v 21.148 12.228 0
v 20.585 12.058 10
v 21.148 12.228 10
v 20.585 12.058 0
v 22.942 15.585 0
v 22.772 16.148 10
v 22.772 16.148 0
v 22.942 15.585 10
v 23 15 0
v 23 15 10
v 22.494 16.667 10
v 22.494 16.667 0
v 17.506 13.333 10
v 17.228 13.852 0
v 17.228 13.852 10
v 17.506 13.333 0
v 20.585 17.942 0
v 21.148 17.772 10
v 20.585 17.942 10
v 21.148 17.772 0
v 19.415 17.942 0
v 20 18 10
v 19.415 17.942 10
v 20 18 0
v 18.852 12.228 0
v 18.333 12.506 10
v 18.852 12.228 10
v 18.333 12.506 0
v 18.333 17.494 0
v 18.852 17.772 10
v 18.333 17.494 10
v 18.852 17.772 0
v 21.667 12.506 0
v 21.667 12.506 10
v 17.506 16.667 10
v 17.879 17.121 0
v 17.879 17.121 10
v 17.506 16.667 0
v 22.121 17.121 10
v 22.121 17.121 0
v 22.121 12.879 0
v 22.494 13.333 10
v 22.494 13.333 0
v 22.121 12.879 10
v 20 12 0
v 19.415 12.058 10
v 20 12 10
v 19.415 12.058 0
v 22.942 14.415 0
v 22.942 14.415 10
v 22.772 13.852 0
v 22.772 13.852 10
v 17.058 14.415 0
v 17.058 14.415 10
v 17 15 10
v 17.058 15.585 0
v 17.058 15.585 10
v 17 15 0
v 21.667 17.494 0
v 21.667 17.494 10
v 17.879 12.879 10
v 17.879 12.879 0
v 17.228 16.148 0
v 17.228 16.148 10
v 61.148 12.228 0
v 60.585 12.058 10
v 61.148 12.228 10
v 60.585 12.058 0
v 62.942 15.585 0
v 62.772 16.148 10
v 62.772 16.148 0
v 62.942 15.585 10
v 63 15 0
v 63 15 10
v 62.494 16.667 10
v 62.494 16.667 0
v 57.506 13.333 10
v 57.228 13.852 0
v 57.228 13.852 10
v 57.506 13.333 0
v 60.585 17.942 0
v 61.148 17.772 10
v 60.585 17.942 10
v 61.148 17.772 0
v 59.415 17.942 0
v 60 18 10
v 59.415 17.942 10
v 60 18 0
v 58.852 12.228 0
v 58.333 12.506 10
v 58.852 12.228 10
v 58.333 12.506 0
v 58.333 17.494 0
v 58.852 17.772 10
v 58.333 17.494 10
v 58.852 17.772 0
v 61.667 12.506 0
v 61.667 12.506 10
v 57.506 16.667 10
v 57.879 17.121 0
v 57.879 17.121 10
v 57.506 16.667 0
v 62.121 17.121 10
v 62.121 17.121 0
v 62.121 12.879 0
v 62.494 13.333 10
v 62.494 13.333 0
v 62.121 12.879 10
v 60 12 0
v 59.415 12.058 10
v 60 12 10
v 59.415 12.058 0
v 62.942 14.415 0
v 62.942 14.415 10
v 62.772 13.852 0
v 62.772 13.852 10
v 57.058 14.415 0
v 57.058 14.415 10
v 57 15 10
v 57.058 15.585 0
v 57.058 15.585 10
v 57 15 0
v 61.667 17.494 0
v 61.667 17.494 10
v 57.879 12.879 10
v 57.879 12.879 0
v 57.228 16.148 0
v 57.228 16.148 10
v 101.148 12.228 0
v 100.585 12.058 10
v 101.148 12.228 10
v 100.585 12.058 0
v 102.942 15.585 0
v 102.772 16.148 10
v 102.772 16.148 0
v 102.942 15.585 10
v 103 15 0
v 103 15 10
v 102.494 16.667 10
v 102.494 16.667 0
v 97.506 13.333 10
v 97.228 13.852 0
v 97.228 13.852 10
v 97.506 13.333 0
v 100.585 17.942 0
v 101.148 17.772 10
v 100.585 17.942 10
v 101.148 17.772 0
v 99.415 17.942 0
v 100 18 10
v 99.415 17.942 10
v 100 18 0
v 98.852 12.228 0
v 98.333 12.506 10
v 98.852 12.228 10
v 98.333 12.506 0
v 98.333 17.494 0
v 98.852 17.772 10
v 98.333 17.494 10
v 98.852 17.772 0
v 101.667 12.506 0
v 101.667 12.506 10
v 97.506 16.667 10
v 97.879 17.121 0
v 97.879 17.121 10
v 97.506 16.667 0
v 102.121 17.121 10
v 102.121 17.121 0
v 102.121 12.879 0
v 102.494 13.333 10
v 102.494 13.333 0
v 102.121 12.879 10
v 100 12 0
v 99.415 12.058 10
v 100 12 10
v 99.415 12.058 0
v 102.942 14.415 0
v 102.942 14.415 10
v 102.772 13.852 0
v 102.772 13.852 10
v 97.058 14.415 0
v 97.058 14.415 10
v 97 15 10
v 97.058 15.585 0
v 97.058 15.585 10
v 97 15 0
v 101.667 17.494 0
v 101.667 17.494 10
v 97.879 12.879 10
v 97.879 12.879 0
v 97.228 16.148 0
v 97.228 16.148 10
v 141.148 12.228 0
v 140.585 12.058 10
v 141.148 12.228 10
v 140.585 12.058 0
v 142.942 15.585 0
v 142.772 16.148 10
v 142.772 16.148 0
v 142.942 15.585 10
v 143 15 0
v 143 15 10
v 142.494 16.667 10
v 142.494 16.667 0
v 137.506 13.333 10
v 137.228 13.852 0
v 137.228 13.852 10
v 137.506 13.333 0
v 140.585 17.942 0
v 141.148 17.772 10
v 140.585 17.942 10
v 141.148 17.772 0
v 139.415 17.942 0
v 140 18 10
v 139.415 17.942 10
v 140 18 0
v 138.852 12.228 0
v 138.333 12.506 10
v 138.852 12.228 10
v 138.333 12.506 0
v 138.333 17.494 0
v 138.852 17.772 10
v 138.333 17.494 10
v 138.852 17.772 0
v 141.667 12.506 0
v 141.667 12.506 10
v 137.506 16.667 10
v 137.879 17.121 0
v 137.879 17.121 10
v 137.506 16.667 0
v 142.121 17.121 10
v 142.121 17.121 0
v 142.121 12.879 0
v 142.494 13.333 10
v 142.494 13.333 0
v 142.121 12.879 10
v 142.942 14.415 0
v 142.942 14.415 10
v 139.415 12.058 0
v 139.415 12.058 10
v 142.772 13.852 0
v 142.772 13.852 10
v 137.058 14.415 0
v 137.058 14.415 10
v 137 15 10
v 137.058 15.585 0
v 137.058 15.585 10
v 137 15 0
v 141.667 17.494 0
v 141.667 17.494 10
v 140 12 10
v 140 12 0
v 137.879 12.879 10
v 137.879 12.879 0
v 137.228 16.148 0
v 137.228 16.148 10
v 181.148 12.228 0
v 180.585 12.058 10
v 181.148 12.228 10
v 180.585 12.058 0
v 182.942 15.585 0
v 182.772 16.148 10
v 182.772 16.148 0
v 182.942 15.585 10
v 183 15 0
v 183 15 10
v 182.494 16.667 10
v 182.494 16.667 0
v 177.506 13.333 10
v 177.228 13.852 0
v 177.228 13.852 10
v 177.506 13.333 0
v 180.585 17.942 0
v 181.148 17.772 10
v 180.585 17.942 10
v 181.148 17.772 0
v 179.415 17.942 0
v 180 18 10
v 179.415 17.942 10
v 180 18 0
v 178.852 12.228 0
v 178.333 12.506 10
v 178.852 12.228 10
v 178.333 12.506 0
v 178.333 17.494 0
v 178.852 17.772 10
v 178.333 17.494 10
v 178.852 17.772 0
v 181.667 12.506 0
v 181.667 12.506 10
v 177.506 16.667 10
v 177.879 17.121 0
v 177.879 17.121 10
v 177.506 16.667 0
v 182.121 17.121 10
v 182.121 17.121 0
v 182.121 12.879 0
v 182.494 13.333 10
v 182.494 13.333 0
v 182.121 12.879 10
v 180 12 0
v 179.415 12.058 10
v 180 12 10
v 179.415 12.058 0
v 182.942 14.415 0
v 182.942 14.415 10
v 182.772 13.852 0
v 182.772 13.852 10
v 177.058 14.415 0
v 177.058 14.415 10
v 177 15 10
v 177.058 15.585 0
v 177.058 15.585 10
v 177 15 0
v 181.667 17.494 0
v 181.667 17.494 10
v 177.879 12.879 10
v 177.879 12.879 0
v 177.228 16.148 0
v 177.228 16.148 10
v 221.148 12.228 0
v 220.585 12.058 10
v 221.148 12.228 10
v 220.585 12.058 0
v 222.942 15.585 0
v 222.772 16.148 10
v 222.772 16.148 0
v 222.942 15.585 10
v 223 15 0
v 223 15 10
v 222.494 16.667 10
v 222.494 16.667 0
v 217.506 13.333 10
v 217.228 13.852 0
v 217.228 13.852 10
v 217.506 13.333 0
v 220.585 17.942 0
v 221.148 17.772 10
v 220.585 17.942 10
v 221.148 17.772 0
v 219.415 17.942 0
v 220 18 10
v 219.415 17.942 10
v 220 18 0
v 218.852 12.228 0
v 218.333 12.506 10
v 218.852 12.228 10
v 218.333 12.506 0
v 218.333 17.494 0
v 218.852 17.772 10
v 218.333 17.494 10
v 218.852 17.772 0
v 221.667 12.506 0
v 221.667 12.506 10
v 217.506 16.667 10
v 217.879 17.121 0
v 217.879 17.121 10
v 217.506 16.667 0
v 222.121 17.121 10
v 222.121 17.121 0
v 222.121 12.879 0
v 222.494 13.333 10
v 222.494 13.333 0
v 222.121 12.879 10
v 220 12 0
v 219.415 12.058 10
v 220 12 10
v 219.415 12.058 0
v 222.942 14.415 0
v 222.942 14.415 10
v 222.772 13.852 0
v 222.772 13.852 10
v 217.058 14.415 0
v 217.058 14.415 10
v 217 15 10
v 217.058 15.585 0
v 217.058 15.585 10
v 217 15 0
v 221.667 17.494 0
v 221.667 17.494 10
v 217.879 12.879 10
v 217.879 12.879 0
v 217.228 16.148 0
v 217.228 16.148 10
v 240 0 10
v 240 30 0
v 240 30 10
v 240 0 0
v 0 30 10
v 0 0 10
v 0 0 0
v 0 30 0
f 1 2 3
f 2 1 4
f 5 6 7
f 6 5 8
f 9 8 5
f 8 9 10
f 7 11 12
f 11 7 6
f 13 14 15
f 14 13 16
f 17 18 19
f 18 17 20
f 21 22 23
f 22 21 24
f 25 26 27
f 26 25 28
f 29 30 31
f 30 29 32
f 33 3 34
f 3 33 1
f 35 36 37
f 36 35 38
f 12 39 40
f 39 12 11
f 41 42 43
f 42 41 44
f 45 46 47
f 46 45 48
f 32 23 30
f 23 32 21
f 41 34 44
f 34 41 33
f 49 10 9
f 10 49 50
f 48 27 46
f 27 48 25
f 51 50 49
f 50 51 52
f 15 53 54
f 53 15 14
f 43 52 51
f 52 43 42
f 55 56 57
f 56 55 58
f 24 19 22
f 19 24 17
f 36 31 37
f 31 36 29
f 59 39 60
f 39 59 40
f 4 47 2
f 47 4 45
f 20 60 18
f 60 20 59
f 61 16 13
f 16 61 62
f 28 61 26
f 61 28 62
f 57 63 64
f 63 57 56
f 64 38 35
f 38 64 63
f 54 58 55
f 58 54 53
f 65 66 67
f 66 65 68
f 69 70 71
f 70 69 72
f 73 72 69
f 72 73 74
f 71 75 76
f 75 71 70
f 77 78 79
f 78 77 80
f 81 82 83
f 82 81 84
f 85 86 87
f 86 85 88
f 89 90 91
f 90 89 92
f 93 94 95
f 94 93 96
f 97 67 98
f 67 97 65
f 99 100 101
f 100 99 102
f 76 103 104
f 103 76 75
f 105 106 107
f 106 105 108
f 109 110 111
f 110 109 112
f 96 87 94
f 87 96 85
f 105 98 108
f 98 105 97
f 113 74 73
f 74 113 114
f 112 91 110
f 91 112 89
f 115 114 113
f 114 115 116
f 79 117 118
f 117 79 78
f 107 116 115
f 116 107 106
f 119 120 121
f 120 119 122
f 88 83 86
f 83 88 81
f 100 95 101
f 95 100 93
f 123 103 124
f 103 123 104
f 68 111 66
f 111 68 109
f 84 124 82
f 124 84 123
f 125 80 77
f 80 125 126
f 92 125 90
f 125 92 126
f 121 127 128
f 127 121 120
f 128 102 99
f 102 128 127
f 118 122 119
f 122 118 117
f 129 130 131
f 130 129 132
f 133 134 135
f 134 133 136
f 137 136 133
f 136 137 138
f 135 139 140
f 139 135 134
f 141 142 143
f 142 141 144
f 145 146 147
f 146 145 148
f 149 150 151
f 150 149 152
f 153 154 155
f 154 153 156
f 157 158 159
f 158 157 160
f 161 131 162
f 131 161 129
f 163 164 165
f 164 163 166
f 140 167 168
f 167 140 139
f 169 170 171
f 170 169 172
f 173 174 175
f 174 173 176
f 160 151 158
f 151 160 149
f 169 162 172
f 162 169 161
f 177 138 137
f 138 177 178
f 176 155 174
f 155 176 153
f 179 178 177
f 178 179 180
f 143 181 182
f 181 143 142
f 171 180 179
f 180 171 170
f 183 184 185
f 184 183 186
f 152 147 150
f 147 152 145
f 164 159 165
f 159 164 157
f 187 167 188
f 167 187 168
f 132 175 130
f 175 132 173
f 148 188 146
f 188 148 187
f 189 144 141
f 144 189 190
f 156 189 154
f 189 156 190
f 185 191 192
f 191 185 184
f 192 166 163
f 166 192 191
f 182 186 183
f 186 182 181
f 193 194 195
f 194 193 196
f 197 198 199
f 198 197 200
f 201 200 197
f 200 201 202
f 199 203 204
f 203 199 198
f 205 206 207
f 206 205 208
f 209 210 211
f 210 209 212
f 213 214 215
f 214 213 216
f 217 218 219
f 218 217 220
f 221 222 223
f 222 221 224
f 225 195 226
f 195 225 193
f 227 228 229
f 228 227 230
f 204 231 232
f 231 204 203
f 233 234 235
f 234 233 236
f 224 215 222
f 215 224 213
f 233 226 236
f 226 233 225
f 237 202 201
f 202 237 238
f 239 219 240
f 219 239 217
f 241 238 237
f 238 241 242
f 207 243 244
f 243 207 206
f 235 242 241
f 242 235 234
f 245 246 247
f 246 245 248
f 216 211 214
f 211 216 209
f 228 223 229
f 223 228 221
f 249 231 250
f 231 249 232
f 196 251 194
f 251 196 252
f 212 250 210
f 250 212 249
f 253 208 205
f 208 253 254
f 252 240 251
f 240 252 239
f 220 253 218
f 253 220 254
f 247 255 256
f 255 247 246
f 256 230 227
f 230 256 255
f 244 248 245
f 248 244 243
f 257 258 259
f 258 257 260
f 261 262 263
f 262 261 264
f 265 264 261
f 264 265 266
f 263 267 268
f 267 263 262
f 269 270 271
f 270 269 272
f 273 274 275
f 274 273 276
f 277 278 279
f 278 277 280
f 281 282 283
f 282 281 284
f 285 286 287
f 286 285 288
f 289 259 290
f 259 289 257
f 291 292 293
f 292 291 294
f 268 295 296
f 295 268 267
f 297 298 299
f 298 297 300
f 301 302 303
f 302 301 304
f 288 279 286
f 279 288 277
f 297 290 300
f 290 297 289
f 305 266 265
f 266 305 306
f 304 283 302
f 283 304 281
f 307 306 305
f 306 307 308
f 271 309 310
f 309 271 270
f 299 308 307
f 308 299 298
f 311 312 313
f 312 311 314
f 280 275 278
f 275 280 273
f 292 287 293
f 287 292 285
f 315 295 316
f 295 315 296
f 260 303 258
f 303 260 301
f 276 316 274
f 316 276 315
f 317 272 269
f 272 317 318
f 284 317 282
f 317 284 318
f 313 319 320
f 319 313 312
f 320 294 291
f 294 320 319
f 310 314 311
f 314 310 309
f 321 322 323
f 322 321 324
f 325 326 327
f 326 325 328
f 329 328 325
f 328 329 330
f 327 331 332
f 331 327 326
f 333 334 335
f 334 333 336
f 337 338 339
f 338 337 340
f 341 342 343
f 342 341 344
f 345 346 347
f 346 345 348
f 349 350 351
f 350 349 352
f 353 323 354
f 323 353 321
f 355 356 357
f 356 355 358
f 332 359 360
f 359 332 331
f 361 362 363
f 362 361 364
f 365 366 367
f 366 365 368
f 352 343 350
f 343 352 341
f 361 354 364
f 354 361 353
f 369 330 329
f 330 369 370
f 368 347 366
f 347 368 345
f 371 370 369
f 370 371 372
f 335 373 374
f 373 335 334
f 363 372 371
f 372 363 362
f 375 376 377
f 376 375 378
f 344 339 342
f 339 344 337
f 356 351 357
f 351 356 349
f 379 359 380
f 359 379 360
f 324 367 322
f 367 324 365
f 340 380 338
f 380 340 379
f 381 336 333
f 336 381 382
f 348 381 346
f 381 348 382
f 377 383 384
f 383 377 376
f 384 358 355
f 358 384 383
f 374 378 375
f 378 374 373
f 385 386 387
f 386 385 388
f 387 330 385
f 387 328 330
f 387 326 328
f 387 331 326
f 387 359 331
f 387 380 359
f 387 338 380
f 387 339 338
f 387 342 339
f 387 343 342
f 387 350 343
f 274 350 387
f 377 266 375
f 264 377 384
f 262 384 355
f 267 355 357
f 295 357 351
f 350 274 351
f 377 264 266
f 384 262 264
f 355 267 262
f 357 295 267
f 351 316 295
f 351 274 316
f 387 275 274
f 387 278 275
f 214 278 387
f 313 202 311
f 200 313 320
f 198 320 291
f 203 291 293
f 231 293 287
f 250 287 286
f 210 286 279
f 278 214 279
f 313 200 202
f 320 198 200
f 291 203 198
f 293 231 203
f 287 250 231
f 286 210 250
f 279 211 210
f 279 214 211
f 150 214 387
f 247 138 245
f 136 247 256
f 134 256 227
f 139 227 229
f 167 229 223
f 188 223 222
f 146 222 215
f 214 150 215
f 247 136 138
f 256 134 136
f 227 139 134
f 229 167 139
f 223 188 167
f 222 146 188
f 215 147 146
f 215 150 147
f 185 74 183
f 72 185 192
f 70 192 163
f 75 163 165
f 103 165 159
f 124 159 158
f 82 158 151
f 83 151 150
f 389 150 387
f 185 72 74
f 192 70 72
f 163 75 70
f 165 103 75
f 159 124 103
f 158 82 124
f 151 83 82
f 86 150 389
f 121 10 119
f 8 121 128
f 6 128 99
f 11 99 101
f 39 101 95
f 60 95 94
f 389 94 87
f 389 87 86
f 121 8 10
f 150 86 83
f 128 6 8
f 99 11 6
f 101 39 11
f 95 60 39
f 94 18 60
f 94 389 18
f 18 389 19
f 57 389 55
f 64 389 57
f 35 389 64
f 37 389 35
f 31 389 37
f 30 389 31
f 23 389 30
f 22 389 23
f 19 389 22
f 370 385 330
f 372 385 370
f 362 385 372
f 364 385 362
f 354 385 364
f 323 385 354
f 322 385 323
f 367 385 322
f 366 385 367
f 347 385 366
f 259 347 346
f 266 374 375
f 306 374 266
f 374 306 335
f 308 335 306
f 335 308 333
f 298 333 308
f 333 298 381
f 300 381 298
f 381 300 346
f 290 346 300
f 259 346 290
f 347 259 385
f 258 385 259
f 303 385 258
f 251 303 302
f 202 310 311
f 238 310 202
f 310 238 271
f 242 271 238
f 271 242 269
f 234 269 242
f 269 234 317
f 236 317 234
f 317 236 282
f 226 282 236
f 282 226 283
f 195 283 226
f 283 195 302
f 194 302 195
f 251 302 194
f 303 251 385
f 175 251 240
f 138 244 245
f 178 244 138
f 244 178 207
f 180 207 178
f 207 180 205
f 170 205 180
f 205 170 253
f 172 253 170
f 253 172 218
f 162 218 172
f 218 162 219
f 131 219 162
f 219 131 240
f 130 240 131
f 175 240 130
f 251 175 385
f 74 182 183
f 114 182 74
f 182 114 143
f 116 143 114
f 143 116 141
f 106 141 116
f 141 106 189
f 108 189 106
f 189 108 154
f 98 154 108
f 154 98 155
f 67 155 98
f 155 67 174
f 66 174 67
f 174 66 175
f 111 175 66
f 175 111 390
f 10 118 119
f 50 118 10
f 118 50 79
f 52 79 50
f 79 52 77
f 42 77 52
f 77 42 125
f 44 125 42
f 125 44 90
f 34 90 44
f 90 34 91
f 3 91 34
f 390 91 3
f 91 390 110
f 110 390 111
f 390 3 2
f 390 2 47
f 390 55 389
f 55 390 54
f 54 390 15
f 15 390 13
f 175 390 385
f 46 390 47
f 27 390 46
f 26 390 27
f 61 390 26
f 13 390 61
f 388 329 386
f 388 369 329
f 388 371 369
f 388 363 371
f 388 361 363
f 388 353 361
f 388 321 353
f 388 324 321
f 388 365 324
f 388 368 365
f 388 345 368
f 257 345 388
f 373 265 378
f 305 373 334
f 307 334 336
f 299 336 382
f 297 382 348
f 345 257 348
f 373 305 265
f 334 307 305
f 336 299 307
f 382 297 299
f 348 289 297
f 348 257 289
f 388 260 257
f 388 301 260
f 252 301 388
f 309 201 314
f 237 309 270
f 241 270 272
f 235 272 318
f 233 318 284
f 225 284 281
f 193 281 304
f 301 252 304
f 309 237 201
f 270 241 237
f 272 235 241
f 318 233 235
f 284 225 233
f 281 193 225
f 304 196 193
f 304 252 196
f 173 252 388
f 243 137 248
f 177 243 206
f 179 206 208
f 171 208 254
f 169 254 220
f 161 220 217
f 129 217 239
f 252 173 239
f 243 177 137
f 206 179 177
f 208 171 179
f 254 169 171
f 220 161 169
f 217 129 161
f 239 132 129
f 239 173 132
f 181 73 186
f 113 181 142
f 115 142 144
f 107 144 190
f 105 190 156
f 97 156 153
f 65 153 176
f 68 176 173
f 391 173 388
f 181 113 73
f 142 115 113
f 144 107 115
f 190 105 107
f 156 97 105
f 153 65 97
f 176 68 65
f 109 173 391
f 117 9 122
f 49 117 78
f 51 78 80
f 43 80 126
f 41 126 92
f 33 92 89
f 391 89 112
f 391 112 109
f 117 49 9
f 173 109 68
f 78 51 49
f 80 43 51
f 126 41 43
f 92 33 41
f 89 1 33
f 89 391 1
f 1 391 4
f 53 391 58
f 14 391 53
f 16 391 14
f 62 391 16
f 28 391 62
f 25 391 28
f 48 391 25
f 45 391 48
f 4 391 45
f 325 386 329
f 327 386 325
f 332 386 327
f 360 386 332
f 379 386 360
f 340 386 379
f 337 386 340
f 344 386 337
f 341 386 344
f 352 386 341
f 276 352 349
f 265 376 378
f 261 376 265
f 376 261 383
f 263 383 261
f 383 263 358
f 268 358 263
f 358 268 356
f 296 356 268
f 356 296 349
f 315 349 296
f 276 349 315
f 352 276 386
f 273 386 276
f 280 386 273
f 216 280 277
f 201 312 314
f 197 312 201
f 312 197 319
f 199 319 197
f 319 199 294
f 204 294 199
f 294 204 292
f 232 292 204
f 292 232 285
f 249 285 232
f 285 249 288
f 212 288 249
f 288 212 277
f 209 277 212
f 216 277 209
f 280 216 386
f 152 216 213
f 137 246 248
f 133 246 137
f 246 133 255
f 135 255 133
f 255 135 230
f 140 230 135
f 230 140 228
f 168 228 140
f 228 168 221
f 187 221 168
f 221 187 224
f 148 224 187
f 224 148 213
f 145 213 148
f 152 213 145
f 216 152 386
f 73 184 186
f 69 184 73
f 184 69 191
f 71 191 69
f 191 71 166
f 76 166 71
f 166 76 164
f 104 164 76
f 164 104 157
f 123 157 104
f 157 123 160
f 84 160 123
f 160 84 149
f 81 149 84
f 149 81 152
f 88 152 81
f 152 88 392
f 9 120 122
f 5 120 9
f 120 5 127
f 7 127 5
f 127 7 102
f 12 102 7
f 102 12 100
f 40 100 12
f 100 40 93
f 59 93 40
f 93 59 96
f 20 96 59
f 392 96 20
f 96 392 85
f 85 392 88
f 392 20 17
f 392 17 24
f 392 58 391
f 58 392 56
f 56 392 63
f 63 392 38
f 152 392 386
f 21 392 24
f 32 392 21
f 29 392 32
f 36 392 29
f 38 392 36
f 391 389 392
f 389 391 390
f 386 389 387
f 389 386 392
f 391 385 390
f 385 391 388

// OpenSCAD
$fn = 32;

// ----------------------------------------------------------------------
// Long rail: 200-250 mm mounting rail
// ----------------------------------------------------------------------

// --- parameters (mm) ---
rail_l = 240;             // rail length, X
rail_w = 30;              // rail width, Y
rail_t = 10;              // rail thickness, Z
hole_d = 6;               // mounting hole diameter
hole_start = 20;          // first hole offset from the end
hole_pitch = 40;          // hole pitch
holes = 6;                // number of holes

difference() {
  cube([rail_l, rail_w, rail_t]);
  for (i = [0 : holes - 1])
    translate([hole_start + i * hole_pitch, rail_w / 2, -1])
      cylinder(h = rail_t + 2, d = hole_d);
}
